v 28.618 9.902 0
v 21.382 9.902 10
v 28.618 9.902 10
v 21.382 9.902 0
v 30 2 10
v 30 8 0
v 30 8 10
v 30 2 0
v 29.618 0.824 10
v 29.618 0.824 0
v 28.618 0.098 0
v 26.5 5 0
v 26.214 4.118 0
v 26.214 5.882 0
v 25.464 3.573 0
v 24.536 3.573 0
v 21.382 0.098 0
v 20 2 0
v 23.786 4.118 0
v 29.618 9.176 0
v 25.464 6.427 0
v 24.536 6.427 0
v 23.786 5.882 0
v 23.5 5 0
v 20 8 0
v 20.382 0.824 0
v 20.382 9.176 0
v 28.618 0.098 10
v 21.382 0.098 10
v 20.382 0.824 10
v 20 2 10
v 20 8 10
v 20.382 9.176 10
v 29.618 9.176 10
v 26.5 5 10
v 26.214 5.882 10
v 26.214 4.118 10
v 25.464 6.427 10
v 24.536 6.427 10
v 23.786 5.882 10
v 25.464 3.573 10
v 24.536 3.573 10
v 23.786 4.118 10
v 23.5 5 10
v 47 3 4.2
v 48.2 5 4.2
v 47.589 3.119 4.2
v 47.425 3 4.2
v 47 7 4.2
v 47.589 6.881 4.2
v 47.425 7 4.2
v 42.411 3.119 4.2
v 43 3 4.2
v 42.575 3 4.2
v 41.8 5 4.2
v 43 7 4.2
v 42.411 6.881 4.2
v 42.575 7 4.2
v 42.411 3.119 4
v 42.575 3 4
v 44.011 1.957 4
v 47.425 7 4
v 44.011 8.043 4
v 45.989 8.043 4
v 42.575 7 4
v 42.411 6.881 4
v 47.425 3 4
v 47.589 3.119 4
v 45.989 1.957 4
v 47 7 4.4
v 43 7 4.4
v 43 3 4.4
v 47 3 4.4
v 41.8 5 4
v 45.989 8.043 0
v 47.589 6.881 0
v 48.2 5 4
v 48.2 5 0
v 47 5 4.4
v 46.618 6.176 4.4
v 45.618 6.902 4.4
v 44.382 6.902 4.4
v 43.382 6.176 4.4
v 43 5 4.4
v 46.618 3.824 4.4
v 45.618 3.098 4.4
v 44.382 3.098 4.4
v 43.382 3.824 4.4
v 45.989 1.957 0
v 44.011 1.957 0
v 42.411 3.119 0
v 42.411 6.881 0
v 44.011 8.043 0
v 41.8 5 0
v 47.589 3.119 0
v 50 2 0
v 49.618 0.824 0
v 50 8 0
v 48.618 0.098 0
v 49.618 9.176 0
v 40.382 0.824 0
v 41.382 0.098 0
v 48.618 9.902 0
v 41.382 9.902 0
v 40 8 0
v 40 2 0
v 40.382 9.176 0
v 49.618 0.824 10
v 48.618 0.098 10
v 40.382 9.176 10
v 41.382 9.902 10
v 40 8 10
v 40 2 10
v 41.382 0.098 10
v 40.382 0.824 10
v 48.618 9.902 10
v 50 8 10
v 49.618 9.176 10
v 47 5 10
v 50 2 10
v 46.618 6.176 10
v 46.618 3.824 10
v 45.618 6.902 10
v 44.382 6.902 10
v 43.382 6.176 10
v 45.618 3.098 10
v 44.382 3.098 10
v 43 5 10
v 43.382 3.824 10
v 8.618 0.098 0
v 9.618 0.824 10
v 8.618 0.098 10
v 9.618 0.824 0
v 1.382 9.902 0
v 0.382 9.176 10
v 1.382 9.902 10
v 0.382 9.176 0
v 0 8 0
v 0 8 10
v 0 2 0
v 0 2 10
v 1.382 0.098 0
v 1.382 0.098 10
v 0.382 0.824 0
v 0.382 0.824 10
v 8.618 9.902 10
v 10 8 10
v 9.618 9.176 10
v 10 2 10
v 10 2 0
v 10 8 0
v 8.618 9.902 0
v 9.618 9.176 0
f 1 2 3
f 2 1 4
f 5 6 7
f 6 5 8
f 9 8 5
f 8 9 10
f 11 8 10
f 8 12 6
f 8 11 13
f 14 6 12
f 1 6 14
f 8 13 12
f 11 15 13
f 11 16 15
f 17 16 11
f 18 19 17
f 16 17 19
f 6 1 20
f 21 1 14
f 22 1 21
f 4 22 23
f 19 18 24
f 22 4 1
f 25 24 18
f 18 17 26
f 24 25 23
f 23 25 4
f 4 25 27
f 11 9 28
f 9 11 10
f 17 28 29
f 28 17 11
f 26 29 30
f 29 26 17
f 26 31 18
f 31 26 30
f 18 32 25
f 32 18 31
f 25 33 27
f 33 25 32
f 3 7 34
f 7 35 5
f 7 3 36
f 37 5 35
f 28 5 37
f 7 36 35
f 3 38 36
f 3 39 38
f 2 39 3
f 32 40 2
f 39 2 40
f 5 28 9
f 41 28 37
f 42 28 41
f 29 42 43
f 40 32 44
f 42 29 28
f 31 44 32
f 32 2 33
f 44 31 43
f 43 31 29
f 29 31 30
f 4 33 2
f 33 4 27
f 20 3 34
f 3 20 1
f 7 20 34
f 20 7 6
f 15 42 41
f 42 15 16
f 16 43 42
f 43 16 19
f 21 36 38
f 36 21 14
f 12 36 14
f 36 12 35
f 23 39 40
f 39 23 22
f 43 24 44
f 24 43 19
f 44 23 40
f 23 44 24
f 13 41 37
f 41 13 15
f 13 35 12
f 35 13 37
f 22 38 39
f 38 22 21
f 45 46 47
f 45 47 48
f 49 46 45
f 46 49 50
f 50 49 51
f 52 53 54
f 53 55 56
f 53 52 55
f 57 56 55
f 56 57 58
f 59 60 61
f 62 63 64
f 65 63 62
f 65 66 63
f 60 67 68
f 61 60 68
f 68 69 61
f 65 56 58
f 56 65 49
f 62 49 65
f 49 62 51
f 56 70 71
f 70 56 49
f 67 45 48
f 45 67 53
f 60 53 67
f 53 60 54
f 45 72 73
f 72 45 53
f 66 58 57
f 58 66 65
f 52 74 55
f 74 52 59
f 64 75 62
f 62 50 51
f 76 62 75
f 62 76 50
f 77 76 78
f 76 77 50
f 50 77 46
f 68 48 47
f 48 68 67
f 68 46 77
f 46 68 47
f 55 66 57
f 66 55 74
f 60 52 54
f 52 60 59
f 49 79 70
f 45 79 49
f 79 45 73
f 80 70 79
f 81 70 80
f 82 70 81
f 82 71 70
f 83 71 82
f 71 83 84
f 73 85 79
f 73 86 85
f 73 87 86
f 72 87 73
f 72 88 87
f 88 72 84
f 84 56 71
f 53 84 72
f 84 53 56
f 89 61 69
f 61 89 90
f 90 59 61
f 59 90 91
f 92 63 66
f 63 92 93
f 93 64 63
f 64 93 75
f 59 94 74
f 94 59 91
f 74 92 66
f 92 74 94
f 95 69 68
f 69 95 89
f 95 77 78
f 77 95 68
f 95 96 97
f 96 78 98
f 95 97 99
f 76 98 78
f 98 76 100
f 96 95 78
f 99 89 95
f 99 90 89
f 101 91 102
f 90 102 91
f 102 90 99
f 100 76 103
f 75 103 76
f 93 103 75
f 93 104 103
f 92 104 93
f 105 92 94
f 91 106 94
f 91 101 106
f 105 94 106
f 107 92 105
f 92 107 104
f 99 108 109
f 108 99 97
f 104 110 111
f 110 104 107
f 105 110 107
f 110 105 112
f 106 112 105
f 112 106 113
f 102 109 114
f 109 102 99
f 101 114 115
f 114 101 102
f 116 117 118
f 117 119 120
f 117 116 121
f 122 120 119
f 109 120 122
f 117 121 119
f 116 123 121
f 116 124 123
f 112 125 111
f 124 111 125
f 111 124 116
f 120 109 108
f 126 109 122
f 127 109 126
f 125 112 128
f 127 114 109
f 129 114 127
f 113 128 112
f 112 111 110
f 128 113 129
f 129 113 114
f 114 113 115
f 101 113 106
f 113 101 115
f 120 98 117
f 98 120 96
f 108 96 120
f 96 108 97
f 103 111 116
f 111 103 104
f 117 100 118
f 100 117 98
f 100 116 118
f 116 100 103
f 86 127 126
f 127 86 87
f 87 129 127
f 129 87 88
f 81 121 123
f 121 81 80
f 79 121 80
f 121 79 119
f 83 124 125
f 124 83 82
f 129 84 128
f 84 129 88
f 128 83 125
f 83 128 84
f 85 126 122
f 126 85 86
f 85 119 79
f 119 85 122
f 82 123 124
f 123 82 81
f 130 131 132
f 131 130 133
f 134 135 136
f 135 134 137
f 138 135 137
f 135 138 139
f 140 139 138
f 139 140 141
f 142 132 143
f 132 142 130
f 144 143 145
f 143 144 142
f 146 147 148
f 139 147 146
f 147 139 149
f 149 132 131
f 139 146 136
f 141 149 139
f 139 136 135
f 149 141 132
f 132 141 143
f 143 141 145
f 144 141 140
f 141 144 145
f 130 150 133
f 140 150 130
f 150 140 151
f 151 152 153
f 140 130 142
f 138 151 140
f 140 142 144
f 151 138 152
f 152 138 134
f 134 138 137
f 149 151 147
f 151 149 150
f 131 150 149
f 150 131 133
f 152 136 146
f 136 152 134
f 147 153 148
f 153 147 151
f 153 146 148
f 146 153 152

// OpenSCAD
// This is meant to illustrate use of `screwBoss.scad`. The screwBoss
// library is most easily called using variables laying out the dimensions
// of the screw of interest.
//
// Inputs
// ------
//  headHeight -- height of the screw head (mm)
//  headDiam -- outer diameter of the head (mm)
//  screwLength -- length of the screw, excluding the head (mm)
//  screwDiam -- outer diameter of the threads (mm)
//  filletRadius -- radius of edge blending (mm)
//  nutHeight -- (optional) thickness of the nut (mm)
//  nutFlats -- (optional) distance from flat-to-flat on the nut (mm)
//  isFloating -- (default=false) adds a 45 degree chamfer to the boss for
//    printability (true | false)


// Include modules from the library.
use <screwBoss.scad>;


// Set the resolution pretty low for design. Increase for final render.
$fn = 10;

// Set dimensions for the screw. These are for an M3x20mm cap screw.
headHeight = 3;
headDiam = 5.4;
screwLength = 10;
screwDiam = 3;
nutHeight = 2.4;
nutFlats = 5.5;
filletRadius = 2;
isFloating = false;

bossW = 10;


// EXAMPLE 1: PLace a boss
// Place a boss. Use named parameters for readability.
boss(W=bossW, L=screwLength, R=filletRadius);


// EXAMPLE 2: PLace a boss with an interference hole cut out.
// Subtract a clearance hole from the boss. The result can be relocated.
translate([2*bossW, 0, 0]) difference() {
  boss(W=bossW, L=screwLength, R=filletRadius);
  interferenceNegative(D=screwDiam, L=screwLength, W=bossW);
}


// EXAMPLE 3: Place a boss with a clearance hole and a screw head recess.
// Note that an interference hole and screw head recess would not be used
// together because the screw wouldn't hold anything in place. It would
// be like placing a nut on a bolt with nothing between the bolt head and
// the nut.
translate([4*bossW, 0, 0]) difference() {
  boss(W=bossW, L=screwLength, R=filletRadius);
  clearanceNegative(D=screwDiam, L=screwLength, W=bossW);
  screwHeadNegative(D=headDiam, H=headHeight, d=screwDiam, W=bossW);
}
